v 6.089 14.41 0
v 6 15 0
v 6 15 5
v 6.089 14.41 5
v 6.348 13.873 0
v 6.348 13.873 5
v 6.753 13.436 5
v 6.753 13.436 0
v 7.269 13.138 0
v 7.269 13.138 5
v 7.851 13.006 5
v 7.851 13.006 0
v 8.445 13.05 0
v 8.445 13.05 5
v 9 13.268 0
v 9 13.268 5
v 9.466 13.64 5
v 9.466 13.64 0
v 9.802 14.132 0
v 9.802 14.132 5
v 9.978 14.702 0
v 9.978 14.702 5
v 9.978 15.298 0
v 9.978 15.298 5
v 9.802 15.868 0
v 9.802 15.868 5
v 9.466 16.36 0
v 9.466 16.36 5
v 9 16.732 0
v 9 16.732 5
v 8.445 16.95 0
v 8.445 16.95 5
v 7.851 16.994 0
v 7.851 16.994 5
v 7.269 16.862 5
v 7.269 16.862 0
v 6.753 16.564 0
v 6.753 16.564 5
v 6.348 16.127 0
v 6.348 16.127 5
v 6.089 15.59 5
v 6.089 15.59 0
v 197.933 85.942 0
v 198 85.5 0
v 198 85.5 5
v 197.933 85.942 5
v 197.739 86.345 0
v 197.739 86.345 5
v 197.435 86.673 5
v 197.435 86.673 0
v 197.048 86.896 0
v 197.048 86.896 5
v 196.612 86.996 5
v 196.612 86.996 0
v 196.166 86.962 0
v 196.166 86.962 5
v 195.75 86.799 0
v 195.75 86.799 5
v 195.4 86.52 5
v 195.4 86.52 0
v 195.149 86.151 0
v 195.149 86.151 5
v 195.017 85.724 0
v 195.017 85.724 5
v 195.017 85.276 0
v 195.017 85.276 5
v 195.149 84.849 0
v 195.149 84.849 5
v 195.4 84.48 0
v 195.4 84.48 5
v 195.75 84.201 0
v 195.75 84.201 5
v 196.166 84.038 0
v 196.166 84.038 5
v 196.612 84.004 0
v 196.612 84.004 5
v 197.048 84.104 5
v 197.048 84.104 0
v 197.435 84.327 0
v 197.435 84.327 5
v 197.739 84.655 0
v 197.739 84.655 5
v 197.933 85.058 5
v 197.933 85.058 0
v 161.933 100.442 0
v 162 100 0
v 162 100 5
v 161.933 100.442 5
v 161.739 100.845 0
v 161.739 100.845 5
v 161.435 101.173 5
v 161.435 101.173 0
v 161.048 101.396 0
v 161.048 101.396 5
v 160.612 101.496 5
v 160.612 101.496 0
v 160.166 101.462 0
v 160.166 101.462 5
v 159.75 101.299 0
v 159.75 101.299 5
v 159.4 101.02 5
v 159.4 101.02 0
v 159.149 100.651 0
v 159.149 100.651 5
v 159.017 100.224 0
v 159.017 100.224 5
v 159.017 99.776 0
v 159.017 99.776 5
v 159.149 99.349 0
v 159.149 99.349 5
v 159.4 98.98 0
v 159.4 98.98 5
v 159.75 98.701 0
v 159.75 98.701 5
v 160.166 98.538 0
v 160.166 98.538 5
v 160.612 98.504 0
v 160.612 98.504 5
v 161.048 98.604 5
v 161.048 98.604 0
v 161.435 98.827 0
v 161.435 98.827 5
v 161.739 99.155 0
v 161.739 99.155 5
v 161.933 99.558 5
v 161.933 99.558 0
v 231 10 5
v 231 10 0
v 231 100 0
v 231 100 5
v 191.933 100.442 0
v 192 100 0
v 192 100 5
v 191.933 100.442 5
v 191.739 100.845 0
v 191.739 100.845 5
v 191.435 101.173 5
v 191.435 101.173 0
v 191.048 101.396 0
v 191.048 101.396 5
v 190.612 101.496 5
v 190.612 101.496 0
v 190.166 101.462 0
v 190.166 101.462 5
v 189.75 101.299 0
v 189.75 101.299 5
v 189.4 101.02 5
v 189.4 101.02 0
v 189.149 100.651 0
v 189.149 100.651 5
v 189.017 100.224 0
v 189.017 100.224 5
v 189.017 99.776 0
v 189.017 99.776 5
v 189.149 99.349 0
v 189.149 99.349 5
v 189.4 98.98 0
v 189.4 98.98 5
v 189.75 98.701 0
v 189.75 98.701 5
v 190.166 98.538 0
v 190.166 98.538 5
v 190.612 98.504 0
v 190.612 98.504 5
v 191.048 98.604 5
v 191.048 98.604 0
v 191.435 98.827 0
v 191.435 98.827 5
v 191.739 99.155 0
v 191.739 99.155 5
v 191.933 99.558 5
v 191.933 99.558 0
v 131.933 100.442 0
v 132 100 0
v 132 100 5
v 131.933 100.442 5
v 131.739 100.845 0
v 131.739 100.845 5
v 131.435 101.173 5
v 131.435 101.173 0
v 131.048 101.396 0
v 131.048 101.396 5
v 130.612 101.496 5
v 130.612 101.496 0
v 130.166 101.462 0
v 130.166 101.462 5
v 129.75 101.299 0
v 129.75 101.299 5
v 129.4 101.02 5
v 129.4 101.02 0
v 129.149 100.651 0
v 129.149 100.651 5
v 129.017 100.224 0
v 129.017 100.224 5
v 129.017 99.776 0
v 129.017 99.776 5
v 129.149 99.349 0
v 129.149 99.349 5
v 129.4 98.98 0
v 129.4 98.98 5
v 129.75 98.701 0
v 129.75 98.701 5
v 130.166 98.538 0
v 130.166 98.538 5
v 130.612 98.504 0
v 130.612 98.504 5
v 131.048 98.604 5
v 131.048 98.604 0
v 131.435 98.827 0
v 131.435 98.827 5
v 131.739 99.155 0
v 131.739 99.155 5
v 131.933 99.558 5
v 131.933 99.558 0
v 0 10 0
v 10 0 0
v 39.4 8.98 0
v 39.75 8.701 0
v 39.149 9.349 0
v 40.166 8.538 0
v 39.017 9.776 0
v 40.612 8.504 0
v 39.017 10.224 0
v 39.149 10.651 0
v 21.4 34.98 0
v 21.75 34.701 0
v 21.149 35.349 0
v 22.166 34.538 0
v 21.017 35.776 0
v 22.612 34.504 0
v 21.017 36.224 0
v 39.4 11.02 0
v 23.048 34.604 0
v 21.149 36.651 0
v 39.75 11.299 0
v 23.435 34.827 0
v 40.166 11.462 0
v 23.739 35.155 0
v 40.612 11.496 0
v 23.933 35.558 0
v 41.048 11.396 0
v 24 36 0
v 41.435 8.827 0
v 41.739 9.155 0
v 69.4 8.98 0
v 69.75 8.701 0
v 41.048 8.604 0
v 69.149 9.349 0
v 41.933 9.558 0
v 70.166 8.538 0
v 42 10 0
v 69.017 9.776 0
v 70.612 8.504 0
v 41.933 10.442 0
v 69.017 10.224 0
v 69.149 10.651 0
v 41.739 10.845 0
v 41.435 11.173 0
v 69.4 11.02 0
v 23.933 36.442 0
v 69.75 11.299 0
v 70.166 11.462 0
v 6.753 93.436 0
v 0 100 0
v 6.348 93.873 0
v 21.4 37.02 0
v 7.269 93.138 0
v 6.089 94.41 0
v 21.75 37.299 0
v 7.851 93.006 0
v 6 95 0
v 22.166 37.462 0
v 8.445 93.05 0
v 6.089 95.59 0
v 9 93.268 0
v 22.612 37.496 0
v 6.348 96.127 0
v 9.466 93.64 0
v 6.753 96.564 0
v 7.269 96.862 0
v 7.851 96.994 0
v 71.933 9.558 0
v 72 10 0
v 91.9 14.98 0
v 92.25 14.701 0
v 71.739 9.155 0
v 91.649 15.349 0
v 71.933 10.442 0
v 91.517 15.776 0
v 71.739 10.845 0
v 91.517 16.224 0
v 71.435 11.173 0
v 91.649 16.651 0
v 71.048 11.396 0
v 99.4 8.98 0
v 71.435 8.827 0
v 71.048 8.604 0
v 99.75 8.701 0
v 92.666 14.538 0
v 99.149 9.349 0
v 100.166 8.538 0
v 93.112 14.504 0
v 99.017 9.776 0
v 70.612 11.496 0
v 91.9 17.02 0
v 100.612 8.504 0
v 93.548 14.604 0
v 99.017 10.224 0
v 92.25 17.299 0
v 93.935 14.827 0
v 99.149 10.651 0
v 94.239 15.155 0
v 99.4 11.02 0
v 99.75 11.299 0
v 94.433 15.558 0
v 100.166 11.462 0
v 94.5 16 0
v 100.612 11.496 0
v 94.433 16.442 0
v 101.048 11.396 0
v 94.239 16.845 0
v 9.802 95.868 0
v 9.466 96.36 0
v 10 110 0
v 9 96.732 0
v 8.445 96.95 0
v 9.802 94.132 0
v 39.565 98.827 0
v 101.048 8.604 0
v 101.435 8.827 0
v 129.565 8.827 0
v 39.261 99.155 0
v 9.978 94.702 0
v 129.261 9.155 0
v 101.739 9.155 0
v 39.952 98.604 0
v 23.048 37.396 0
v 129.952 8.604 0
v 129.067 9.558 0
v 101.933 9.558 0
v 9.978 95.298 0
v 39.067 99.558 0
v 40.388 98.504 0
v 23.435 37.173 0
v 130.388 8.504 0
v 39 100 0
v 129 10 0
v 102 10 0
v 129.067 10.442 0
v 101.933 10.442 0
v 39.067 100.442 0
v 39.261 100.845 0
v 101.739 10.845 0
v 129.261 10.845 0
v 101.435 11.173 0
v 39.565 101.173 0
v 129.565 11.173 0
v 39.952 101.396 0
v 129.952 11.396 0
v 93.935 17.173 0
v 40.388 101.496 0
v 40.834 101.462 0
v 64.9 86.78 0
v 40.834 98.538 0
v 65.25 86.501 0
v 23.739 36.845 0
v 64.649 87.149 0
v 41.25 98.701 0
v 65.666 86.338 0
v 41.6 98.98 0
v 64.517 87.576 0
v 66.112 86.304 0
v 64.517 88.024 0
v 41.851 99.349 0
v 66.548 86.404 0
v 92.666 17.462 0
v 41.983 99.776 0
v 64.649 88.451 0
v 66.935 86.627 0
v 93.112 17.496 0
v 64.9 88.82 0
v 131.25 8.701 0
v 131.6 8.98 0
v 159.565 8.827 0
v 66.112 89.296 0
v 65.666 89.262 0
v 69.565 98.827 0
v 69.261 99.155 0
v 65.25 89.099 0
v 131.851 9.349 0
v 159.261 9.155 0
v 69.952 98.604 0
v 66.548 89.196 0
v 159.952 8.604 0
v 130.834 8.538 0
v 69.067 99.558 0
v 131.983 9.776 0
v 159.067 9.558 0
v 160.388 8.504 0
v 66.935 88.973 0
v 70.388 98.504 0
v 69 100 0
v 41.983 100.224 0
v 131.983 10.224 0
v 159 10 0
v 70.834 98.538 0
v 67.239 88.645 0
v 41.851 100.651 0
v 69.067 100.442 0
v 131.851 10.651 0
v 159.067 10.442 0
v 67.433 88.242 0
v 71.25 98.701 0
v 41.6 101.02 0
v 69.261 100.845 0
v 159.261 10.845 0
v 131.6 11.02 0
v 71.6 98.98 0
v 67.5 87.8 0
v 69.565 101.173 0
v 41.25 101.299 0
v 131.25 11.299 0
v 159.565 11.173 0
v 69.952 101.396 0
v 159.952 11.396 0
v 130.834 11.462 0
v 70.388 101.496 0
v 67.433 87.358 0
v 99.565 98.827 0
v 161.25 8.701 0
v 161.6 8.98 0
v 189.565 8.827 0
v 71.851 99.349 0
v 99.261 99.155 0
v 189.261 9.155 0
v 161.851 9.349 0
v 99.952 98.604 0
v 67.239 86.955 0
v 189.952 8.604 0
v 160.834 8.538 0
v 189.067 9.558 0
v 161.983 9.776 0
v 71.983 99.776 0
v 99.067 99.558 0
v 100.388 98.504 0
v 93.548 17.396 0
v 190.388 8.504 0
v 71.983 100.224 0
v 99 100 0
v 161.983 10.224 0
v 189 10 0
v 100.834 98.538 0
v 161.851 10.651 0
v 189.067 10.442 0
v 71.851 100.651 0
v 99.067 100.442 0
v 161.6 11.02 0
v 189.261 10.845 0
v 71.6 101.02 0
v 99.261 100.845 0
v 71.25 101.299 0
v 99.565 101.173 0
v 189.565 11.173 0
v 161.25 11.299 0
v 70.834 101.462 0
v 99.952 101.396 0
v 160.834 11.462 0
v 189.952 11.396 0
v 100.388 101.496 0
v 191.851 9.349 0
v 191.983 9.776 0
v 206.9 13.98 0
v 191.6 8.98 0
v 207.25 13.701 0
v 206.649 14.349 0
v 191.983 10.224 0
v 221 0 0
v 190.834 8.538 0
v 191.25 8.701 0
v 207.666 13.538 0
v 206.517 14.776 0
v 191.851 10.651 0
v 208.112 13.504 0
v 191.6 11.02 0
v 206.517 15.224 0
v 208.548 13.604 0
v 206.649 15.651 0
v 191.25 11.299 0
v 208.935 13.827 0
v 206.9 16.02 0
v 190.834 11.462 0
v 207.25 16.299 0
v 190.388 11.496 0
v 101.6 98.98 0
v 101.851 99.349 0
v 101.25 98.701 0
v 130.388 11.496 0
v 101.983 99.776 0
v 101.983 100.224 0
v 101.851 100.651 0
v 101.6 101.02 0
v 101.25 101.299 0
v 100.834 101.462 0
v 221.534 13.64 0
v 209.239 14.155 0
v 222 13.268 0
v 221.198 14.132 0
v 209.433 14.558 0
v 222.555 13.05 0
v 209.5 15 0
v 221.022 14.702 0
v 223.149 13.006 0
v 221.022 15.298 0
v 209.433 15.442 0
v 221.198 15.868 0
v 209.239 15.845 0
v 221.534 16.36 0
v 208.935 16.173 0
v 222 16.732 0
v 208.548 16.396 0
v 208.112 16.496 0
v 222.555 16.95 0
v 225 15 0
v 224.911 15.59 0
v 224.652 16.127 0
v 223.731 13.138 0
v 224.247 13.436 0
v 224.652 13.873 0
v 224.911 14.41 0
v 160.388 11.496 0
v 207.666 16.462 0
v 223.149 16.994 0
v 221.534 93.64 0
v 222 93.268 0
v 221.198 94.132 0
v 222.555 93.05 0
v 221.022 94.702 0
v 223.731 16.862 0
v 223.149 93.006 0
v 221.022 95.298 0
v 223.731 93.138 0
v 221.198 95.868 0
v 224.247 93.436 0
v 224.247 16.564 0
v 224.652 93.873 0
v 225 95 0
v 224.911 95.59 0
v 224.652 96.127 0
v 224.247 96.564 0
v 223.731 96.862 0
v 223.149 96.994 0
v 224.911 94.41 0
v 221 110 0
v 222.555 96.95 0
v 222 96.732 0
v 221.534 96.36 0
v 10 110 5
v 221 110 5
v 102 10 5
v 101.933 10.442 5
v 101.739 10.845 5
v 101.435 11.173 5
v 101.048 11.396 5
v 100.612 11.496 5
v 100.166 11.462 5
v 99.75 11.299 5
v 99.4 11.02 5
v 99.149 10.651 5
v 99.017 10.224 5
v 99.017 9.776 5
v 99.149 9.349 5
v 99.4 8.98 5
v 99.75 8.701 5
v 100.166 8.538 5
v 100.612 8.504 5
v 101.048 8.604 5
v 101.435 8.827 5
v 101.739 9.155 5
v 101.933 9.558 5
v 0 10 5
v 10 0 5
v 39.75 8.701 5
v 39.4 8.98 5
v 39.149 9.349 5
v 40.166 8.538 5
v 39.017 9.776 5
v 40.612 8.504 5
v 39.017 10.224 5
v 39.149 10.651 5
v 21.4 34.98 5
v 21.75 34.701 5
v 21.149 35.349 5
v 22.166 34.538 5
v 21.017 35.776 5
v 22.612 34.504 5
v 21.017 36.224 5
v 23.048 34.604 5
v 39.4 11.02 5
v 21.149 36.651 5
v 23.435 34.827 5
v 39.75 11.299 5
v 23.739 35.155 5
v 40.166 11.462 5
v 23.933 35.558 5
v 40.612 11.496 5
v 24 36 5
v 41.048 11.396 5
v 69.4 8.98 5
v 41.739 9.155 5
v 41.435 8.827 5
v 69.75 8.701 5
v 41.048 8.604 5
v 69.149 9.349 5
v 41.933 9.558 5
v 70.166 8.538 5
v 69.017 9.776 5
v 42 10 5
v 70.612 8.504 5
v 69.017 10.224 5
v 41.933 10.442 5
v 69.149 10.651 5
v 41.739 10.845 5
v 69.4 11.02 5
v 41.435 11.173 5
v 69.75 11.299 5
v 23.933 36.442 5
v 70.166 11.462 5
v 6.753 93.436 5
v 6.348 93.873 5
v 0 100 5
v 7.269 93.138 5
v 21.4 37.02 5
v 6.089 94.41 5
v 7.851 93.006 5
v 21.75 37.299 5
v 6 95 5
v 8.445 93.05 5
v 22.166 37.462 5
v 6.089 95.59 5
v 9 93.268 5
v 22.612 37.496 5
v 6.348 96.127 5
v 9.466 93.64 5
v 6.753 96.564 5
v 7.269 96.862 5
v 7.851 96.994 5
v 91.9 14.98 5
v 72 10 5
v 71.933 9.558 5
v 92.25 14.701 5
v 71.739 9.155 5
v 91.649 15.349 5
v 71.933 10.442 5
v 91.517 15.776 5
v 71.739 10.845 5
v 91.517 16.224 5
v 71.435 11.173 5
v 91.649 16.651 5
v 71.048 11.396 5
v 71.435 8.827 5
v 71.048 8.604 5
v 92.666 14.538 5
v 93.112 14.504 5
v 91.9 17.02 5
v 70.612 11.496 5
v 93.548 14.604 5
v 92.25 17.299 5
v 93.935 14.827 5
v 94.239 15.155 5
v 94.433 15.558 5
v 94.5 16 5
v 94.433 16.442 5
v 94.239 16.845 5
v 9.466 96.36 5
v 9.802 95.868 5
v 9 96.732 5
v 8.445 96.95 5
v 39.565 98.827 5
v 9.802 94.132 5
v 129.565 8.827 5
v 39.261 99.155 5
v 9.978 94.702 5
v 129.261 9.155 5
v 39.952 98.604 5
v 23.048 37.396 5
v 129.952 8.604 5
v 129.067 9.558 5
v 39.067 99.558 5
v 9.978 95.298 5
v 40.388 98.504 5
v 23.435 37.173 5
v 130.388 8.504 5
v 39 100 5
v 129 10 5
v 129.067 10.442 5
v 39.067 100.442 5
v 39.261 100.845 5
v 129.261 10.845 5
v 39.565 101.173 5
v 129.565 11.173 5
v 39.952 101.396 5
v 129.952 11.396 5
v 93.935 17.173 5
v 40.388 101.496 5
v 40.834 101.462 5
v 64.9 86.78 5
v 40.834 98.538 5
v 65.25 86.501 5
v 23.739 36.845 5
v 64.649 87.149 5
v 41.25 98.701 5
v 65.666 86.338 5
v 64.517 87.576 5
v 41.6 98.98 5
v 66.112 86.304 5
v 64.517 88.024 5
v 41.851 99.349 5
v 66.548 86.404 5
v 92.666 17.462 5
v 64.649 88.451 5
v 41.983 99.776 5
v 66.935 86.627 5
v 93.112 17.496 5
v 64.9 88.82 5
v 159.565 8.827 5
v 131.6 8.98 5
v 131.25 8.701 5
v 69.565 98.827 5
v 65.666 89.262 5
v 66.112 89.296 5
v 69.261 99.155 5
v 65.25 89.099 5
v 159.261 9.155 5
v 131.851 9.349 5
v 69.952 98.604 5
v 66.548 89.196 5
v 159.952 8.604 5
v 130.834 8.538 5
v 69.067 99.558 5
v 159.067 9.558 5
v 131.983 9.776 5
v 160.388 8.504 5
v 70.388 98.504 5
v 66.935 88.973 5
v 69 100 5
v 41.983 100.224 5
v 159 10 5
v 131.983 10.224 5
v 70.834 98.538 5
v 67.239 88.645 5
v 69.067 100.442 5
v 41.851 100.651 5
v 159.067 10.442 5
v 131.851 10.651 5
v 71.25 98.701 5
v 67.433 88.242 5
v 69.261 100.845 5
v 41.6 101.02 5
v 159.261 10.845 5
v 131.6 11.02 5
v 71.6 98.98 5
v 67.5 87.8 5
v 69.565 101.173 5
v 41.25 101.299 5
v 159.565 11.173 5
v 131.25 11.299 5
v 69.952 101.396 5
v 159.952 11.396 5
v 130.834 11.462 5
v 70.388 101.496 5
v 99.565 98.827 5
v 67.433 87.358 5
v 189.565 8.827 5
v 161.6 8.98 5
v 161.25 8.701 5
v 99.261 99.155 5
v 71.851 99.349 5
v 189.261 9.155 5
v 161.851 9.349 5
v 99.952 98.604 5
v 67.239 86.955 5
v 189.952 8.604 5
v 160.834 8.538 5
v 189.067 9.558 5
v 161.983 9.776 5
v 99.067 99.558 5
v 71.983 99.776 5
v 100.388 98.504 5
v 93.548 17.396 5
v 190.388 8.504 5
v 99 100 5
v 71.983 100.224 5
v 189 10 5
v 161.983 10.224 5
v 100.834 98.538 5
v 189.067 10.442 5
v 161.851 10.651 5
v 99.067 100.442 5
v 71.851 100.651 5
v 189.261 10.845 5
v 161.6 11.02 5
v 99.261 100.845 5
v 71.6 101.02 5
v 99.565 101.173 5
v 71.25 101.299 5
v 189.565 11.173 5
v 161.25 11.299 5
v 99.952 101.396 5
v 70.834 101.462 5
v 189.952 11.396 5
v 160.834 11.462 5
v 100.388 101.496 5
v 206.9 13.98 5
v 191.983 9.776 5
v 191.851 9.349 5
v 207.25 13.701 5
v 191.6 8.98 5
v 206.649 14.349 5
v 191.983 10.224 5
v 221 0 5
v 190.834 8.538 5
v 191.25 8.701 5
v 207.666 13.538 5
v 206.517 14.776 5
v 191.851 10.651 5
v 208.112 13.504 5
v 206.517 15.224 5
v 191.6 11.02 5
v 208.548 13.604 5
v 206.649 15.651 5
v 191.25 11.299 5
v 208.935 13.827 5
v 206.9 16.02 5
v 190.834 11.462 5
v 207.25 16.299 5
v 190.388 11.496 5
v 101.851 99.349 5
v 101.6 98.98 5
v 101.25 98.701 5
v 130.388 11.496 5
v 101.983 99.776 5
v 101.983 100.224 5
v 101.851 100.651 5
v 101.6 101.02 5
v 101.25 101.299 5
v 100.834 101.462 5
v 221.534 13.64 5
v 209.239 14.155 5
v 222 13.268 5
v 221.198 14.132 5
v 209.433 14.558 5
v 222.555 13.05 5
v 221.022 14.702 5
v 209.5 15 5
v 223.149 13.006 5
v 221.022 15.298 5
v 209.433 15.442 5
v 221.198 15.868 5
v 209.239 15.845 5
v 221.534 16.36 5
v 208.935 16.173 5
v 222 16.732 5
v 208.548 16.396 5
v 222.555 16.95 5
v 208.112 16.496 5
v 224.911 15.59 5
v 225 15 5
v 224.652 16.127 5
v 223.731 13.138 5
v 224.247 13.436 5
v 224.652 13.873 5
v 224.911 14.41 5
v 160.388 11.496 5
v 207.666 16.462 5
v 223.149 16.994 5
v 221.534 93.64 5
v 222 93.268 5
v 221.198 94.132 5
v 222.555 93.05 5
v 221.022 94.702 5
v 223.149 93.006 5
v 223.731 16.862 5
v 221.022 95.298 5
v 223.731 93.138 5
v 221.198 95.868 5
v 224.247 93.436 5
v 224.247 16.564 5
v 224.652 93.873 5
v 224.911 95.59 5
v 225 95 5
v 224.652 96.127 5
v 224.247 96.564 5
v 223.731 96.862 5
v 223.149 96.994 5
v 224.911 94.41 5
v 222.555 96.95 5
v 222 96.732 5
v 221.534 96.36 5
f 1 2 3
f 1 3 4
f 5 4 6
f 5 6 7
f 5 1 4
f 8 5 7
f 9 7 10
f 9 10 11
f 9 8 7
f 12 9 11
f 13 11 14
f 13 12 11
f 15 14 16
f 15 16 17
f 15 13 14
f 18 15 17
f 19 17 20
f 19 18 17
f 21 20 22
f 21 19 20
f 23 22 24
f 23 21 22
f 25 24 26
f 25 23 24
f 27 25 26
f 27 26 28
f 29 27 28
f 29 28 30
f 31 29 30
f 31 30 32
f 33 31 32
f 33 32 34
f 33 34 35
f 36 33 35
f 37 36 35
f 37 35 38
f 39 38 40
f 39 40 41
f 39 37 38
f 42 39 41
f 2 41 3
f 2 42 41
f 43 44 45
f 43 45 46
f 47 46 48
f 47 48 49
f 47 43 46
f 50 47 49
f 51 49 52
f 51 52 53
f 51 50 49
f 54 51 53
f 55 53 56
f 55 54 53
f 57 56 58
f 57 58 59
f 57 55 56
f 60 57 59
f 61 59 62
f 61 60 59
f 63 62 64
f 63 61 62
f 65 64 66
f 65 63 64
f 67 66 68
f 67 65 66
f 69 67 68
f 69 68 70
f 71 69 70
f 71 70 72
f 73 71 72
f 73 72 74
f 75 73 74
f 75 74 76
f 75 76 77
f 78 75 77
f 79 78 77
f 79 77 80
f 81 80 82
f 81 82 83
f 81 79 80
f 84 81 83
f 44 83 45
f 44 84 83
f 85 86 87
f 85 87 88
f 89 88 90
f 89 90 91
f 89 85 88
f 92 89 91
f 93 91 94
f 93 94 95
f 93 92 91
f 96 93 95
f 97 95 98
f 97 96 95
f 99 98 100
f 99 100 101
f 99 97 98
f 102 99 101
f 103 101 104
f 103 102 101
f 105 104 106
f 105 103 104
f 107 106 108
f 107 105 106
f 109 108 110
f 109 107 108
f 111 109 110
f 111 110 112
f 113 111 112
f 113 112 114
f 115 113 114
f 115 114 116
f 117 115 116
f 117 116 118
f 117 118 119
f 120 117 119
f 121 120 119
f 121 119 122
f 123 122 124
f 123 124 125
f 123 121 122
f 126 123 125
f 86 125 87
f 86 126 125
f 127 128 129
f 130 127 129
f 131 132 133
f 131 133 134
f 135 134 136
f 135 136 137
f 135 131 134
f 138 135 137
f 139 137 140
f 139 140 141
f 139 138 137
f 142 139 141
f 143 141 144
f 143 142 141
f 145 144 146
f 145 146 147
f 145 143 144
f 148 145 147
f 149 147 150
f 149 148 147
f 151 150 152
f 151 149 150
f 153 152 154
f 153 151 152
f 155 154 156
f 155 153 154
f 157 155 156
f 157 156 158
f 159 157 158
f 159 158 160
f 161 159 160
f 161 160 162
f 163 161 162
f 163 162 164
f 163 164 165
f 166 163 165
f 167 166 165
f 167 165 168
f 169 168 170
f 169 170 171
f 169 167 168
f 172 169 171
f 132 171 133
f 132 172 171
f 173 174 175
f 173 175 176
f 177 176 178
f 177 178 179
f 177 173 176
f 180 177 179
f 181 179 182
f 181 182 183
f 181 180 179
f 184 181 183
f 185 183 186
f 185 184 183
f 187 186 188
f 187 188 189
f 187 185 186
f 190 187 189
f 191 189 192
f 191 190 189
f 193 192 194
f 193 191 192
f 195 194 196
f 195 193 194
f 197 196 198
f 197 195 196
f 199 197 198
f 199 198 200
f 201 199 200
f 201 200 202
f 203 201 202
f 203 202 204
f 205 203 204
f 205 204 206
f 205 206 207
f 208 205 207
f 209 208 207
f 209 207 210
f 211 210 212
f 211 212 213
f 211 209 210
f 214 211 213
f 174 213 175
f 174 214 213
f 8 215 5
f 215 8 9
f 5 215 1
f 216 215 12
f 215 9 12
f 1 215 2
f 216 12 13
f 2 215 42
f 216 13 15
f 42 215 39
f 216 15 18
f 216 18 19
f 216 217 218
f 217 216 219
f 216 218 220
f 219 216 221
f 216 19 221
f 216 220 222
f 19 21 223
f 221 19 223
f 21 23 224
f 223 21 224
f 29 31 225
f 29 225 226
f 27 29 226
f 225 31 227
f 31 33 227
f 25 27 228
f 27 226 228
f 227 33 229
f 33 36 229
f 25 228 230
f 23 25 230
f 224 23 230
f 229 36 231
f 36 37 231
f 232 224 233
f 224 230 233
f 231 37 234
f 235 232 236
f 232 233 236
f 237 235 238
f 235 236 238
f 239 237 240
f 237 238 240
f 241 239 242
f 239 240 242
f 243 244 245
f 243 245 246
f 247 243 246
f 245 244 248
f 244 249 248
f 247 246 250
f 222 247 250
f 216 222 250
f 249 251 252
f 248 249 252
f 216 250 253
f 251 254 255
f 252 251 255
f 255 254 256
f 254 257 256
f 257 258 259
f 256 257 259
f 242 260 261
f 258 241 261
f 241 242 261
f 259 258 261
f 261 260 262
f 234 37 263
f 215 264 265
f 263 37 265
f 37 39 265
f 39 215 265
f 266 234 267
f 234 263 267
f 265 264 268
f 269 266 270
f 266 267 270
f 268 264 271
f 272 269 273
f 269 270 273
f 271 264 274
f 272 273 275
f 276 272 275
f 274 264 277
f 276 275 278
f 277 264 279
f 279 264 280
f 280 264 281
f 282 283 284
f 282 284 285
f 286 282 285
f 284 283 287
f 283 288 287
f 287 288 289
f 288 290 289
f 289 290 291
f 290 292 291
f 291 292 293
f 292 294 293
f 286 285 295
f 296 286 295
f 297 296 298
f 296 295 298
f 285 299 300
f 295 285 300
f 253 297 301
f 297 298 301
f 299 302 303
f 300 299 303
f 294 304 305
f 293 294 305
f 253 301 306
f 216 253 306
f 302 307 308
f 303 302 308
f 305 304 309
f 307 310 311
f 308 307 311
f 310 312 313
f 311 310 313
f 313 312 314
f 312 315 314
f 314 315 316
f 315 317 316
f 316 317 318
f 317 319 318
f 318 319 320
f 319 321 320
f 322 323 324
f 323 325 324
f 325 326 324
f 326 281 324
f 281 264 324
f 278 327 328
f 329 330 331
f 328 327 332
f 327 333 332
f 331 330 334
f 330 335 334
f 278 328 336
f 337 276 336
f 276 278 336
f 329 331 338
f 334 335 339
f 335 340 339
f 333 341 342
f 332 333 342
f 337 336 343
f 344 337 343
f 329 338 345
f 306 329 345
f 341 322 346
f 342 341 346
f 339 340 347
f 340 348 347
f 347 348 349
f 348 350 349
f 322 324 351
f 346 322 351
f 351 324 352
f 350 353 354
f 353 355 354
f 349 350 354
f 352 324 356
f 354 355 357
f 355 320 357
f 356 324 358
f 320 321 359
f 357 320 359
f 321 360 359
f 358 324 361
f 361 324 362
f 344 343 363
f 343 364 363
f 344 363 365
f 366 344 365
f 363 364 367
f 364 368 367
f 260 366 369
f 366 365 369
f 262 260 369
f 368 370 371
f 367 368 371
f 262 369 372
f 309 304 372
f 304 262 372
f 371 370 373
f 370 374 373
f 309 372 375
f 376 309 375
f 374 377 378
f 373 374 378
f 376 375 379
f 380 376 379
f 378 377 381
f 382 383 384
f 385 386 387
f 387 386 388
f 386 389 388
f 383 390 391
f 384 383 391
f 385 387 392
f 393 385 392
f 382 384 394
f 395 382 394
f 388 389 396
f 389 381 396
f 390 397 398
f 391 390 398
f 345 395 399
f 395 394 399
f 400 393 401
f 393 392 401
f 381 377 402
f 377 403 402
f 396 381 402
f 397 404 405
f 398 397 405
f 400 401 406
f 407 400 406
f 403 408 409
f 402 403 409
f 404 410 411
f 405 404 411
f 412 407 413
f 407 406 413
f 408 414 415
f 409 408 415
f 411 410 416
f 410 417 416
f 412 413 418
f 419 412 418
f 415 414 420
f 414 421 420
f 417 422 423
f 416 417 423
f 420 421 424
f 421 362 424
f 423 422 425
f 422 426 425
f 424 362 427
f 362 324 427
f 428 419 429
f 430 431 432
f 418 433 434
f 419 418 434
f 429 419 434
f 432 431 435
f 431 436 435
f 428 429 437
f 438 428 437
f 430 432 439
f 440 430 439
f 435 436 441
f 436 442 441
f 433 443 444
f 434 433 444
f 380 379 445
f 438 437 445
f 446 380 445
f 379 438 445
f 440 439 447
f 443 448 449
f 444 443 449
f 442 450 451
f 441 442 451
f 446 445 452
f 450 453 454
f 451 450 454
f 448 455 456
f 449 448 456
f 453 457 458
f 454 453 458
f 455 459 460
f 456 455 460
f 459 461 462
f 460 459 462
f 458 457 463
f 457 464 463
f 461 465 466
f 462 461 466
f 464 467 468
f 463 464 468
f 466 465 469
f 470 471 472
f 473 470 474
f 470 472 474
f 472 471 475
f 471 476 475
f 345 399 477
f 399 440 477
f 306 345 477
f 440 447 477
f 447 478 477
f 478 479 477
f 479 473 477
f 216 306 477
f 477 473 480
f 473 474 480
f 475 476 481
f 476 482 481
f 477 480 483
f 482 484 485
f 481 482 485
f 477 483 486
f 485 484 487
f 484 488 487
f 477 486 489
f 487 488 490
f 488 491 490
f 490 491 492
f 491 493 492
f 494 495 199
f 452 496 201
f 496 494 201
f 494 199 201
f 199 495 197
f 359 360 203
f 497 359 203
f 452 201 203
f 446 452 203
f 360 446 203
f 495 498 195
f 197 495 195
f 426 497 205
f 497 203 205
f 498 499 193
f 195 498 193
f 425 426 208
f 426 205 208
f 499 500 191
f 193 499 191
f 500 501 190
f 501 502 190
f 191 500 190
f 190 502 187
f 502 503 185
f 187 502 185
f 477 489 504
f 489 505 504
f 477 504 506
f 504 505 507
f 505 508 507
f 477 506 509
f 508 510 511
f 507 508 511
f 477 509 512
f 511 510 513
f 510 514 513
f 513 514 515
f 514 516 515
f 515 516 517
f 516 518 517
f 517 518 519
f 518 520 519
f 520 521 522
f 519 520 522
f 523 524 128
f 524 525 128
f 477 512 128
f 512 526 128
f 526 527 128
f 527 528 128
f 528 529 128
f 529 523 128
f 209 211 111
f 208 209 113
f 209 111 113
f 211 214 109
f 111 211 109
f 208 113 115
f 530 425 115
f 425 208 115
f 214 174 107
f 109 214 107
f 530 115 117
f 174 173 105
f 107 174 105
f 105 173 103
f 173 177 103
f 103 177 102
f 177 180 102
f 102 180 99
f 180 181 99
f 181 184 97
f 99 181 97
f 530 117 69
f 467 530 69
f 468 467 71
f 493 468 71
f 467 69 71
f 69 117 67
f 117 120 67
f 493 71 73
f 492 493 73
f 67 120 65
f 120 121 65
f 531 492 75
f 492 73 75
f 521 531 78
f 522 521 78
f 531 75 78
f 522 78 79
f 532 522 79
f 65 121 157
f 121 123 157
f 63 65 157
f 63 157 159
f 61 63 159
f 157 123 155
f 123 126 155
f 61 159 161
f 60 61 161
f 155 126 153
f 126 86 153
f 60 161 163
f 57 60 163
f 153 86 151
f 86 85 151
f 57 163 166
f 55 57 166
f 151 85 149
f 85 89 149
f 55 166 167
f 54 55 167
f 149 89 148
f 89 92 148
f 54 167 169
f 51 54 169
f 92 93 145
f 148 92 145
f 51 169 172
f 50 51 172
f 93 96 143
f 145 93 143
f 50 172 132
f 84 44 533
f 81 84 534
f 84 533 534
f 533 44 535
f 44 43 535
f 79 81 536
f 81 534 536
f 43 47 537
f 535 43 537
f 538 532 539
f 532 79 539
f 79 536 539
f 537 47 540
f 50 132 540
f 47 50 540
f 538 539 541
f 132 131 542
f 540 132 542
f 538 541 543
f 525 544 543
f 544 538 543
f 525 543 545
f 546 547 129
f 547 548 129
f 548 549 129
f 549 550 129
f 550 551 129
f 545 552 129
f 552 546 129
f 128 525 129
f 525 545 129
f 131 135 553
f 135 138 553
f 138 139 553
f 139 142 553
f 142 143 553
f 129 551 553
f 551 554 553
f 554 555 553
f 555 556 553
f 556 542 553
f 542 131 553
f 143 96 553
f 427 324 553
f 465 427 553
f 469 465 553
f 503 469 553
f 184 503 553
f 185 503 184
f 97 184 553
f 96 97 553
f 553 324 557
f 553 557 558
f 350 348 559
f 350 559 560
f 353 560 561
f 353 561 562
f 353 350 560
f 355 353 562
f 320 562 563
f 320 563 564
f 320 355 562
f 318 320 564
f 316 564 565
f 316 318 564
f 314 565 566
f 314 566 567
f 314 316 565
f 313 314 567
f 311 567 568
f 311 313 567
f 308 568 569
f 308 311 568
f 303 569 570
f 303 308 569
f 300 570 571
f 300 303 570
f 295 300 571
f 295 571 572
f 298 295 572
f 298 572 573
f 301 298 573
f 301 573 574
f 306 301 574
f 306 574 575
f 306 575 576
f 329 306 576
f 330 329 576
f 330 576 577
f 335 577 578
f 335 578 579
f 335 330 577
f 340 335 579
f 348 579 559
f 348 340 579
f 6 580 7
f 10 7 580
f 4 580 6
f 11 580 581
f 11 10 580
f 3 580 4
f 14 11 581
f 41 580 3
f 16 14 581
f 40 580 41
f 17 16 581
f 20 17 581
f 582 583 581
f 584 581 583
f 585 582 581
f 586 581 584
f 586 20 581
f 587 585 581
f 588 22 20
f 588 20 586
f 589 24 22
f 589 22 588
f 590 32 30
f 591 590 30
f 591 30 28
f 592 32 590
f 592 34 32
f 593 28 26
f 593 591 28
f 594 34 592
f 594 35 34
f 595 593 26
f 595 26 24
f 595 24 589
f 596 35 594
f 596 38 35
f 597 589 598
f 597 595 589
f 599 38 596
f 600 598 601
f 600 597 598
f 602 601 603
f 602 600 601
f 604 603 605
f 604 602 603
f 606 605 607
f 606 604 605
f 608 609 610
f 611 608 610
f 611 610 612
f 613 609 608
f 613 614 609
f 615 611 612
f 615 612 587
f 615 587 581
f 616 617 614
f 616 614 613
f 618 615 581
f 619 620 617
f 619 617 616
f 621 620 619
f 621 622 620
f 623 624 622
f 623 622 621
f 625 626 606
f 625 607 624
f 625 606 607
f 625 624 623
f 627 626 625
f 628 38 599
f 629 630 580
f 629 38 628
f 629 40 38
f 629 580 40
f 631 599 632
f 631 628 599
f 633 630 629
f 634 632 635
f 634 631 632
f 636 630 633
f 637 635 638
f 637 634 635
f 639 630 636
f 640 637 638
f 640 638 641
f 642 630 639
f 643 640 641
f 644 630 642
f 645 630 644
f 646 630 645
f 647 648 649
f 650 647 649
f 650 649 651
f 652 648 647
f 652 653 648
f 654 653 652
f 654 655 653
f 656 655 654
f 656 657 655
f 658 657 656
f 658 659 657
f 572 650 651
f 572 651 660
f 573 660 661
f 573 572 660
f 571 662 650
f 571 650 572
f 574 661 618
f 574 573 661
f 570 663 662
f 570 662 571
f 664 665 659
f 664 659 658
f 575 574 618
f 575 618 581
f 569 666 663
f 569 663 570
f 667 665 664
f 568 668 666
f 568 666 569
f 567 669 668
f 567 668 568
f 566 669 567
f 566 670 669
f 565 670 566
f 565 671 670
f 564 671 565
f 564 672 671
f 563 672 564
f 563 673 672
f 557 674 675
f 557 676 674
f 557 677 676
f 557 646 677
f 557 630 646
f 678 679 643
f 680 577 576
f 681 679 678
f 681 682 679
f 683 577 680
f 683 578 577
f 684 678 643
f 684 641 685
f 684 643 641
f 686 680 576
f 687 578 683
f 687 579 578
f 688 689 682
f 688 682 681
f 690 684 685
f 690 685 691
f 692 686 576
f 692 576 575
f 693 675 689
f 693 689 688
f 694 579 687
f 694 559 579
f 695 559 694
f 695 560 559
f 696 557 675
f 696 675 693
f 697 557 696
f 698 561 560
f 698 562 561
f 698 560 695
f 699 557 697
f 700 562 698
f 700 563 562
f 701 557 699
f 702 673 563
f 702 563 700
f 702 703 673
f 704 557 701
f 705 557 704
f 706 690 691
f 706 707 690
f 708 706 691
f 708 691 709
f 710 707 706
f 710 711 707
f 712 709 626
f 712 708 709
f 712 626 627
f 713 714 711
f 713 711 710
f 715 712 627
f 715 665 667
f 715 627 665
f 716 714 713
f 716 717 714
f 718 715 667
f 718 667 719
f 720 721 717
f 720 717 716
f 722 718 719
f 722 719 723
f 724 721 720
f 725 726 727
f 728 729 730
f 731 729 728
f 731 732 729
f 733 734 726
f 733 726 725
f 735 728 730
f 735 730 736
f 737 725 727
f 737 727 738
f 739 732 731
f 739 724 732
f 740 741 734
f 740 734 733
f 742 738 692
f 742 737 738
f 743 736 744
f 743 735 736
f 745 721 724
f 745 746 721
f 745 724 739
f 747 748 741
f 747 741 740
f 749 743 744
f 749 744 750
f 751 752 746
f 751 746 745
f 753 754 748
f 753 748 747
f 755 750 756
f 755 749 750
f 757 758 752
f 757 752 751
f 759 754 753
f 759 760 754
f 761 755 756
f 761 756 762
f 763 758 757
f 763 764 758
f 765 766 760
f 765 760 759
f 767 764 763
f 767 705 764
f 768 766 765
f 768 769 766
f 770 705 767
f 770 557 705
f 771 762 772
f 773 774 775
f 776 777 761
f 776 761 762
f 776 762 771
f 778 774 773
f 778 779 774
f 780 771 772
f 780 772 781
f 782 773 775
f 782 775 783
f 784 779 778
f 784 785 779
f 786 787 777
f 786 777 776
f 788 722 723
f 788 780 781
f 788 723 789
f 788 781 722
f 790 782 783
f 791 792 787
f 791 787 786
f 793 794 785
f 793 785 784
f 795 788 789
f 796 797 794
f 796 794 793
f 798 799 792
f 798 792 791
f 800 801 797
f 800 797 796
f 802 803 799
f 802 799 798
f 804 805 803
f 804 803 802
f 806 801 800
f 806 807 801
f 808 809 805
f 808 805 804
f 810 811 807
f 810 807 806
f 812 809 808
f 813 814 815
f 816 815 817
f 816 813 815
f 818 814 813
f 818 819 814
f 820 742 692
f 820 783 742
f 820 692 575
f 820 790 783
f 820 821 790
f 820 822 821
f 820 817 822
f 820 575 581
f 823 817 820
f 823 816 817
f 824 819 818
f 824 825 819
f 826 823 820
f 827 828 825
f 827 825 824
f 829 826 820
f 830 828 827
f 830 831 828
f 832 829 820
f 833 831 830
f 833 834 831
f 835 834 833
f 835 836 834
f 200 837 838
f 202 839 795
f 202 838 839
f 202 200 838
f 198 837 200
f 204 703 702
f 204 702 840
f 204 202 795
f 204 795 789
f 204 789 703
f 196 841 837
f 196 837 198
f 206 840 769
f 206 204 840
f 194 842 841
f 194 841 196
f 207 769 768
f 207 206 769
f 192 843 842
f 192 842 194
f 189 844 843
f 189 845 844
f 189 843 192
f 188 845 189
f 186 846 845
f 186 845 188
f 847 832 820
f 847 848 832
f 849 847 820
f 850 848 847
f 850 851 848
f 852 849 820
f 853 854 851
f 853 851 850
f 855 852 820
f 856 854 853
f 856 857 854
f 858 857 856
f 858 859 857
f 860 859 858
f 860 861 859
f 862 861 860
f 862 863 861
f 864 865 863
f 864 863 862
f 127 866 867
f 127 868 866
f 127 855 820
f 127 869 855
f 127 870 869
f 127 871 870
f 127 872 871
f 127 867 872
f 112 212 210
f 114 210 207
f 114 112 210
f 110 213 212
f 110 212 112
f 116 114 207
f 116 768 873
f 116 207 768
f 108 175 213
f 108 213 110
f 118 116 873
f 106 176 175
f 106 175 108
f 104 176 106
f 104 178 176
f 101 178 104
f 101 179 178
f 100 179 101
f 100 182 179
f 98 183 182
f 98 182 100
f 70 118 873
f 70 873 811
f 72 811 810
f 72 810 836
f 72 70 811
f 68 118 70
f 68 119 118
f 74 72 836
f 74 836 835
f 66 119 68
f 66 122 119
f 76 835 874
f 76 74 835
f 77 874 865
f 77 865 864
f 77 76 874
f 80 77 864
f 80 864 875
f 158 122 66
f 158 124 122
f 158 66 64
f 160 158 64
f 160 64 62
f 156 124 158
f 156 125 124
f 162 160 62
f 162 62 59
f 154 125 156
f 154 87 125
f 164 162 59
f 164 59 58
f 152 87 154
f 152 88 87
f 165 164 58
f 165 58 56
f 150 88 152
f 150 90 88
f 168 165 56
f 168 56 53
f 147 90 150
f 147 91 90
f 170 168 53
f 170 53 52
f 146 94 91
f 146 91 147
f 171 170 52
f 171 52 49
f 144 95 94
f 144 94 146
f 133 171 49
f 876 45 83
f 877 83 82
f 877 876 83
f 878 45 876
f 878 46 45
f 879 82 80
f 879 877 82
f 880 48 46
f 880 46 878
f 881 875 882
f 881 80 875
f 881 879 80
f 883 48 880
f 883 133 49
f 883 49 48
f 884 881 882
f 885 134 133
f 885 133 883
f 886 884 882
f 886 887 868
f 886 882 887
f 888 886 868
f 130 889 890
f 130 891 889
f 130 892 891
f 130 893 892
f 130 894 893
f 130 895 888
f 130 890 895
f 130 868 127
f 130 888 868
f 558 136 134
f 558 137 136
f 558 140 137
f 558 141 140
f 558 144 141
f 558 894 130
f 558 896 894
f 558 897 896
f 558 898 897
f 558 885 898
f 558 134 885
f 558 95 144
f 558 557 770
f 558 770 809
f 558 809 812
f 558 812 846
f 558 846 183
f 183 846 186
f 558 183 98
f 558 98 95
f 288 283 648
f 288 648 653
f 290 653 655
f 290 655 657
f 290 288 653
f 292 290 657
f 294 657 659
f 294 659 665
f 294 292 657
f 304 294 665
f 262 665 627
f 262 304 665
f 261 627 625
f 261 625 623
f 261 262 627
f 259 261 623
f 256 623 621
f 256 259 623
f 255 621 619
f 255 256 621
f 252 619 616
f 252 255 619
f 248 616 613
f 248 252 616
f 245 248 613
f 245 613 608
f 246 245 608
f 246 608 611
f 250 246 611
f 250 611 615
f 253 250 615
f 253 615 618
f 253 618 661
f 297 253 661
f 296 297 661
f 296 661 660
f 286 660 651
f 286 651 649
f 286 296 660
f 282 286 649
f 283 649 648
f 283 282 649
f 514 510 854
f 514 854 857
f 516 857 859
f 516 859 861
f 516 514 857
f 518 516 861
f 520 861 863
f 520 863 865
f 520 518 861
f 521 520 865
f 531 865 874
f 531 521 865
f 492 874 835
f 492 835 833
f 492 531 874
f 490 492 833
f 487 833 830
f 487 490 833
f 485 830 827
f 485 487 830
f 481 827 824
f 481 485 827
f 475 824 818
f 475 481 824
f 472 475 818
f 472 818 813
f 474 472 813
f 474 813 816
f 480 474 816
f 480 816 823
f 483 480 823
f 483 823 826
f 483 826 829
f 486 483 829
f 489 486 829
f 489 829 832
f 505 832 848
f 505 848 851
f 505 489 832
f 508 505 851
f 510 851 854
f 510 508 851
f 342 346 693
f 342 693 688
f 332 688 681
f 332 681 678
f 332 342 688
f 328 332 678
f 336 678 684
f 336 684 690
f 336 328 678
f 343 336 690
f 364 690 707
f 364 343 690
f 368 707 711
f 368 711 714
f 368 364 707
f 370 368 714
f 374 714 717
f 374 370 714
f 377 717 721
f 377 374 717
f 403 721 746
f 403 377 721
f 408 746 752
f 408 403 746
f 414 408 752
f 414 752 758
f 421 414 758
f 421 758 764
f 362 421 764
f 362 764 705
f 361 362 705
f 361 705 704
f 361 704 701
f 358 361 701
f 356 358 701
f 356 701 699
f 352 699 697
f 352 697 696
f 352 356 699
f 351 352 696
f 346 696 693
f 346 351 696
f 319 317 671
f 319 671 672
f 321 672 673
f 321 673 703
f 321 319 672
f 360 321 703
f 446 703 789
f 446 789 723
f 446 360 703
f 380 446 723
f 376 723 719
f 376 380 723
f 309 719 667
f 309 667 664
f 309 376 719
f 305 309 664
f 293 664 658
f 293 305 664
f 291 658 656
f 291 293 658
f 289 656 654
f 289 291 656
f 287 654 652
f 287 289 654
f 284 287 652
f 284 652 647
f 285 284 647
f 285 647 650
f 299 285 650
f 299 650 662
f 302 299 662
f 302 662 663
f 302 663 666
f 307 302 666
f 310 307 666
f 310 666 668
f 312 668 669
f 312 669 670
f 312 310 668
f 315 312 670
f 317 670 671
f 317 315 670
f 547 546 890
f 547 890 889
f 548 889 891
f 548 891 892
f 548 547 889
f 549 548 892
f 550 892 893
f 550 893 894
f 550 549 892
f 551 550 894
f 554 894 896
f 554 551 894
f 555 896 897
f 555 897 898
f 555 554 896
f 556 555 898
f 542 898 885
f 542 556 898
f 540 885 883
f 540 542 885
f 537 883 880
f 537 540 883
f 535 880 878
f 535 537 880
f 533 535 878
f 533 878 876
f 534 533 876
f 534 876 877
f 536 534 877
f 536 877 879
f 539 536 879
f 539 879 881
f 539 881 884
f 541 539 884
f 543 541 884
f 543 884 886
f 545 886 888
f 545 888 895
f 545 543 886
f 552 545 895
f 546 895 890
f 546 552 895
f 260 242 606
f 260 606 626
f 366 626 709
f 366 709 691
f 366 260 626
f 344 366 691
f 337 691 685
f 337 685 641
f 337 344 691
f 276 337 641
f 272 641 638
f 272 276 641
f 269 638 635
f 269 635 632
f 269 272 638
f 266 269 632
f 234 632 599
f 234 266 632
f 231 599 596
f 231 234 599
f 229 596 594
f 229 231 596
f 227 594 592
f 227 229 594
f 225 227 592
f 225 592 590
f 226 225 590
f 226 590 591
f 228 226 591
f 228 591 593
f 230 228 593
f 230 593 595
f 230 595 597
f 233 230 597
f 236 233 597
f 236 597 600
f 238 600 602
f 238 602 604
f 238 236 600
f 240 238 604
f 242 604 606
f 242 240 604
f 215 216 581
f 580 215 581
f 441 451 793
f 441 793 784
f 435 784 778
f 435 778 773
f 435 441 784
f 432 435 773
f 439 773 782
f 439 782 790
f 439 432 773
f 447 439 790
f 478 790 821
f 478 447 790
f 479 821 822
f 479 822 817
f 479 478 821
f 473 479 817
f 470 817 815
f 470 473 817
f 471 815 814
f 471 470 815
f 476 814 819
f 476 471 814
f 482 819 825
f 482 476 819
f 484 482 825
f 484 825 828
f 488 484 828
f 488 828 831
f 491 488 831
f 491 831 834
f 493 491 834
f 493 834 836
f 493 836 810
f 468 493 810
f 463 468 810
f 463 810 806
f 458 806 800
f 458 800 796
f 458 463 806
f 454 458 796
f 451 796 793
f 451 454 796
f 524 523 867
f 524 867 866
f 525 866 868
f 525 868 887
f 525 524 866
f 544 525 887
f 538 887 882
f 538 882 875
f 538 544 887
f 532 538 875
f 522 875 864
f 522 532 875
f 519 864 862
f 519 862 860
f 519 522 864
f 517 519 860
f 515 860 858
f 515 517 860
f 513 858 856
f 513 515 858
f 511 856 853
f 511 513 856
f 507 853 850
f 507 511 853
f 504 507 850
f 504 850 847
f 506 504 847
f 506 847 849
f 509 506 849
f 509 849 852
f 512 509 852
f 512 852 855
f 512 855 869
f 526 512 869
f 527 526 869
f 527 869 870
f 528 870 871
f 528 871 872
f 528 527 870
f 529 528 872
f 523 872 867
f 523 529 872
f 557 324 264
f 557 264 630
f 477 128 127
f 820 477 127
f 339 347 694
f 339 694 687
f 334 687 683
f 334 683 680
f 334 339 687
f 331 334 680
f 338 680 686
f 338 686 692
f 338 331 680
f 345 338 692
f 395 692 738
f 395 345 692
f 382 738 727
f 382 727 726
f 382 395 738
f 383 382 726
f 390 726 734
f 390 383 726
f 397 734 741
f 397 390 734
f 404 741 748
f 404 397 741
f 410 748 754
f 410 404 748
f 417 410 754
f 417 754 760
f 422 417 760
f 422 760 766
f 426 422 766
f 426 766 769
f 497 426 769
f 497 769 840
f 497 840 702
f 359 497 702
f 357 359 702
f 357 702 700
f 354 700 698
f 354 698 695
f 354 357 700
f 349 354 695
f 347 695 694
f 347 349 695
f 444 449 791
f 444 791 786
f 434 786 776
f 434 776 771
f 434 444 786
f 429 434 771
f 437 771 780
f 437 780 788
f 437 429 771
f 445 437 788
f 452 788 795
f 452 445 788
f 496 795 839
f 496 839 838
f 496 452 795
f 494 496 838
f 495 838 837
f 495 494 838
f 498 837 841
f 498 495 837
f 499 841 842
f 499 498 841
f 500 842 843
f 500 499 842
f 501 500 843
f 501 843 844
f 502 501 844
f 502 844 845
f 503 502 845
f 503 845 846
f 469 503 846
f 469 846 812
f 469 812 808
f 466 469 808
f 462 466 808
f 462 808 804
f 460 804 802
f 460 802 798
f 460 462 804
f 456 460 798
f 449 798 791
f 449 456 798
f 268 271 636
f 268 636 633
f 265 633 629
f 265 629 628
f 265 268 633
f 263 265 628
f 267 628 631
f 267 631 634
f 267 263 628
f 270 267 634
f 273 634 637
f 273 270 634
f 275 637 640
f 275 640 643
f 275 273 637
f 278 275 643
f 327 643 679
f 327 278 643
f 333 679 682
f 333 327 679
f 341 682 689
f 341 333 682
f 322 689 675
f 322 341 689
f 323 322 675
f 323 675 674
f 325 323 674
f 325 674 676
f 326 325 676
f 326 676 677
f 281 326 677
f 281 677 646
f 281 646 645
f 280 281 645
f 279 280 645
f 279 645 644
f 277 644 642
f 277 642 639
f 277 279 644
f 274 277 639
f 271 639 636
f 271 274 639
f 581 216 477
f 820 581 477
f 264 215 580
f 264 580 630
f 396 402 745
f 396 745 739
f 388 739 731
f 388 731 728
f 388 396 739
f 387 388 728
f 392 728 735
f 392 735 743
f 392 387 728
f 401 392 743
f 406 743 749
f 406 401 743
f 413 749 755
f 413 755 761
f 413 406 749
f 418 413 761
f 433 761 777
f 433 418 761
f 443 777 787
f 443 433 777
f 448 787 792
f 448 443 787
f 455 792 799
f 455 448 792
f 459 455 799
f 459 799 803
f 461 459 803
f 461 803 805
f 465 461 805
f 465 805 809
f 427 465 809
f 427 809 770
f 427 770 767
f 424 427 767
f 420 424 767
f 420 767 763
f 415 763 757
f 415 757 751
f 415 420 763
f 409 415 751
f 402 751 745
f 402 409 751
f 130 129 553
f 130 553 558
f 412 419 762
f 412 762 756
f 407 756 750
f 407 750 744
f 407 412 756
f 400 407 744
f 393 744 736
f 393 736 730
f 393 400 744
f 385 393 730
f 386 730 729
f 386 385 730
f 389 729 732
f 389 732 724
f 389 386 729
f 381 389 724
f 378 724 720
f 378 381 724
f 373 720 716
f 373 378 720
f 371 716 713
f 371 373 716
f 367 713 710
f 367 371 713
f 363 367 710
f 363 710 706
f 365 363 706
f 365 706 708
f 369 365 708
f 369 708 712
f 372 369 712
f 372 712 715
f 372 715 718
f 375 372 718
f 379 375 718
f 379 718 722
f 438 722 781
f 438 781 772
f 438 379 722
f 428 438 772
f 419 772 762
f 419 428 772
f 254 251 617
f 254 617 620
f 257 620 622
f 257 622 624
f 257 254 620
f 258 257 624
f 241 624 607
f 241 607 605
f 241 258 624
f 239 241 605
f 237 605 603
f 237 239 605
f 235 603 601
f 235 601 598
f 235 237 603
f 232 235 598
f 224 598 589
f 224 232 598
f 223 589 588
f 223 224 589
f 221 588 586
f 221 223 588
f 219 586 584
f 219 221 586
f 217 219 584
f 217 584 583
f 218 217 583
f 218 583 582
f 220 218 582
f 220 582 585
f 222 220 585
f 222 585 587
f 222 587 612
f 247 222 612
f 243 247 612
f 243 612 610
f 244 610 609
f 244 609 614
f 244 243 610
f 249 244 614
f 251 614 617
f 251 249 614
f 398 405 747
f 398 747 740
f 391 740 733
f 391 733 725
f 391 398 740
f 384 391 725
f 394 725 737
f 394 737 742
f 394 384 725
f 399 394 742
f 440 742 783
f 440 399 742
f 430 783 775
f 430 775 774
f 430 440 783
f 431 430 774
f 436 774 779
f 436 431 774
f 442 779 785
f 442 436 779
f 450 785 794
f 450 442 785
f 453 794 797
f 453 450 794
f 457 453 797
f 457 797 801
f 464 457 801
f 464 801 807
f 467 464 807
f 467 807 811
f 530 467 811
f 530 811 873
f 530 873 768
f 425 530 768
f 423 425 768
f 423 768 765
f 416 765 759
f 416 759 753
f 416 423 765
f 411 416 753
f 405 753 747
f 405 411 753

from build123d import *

# Parameters (mm, degrees)
SKETCH1_W           = 231
SKETCH1_H           = 110
SKETCH1_R           = 1.5
SKETCH1_R_2         = 2
BOSS_EXTRUDE1_DEPTH = 5
CHAMFER1_SIZE       = 10


with BuildPart() as part:
    # Sketch1 → Boss-Extrude1 (new body)
    with BuildSketch(Plane.XY):
        with Locations((115.5, 55)):
            Rectangle(SKETCH1_W, SKETCH1_H)
        with Locations((196.5, 85.5)):
            Circle(SKETCH1_R, mode=Mode.SUBTRACT)
        with Locations((93, 16)):
            Circle(SKETCH1_R, mode=Mode.SUBTRACT)
        with Locations((66, 87.8)):
            Circle(SKETCH1_R, mode=Mode.SUBTRACT)
        with Locations((22.5, 36)):
            Circle(SKETCH1_R, mode=Mode.SUBTRACT)
        with Locations((223, 95)):
            Circle(SKETCH1_R_2, mode=Mode.SUBTRACT)
        with Locations((223, 15)):
            Circle(SKETCH1_R_2, mode=Mode.SUBTRACT)
        with Locations(Location((8, 95, 0), (0, 0, 180))):
            Circle(SKETCH1_R_2, mode=Mode.SUBTRACT)
        with Locations(Location((8, 15, 0), (0, 0, 180))):
            Circle(SKETCH1_R_2, mode=Mode.SUBTRACT)
        with Locations((208, 15)):
            Circle(SKETCH1_R, mode=Mode.SUBTRACT)
        with Locations((130.5, 100)):
            Circle(SKETCH1_R, mode=Mode.SUBTRACT)
        with Locations((160.5, 100)):
            Circle(SKETCH1_R, mode=Mode.SUBTRACT)
        with Locations((190.5, 100)):
            Circle(SKETCH1_R, mode=Mode.SUBTRACT)
        with Locations(Location((40.5, 100, 0), (0, 0, 180))):
            Circle(SKETCH1_R, mode=Mode.SUBTRACT)
        with Locations(Location((70.5, 100, 0), (0, 0, 180))):
            Circle(SKETCH1_R, mode=Mode.SUBTRACT)
        with Locations(Location((100.5, 100, 0), (0, 0, 180))):
            Circle(SKETCH1_R, mode=Mode.SUBTRACT)
        with Locations((100.5, 10)):
            Circle(SKETCH1_R, mode=Mode.SUBTRACT)
        with Locations((70.5, 10)):
            Circle(SKETCH1_R, mode=Mode.SUBTRACT)
        with Locations((40.5, 10)):
            Circle(SKETCH1_R, mode=Mode.SUBTRACT)
        with Locations(Location((190.5, 10, 0), (0, 0, 180))):
            Circle(SKETCH1_R, mode=Mode.SUBTRACT)
        with Locations(Location((160.5, 10, 0), (0, 0, 180))):
            Circle(SKETCH1_R, mode=Mode.SUBTRACT)
        with Locations(Location((130.5, 10, 0), (0, 0, 180))):
            Circle(SKETCH1_R, mode=Mode.SUBTRACT)
    extrude(amount=BOSS_EXTRUDE1_DEPTH)

    # Chamfer1
    chamfer1_edges = [part.edges().sort_by_distance(p)[0] for p in [
        (0, 110, 2.5),
        (231, 110, 2.5),
        (231, 0, 2.5),
        (0, 0, 2.5),
    ]]
    chamfer(chamfer1_edges, length=CHAMFER1_SIZE)


solid = part.part
